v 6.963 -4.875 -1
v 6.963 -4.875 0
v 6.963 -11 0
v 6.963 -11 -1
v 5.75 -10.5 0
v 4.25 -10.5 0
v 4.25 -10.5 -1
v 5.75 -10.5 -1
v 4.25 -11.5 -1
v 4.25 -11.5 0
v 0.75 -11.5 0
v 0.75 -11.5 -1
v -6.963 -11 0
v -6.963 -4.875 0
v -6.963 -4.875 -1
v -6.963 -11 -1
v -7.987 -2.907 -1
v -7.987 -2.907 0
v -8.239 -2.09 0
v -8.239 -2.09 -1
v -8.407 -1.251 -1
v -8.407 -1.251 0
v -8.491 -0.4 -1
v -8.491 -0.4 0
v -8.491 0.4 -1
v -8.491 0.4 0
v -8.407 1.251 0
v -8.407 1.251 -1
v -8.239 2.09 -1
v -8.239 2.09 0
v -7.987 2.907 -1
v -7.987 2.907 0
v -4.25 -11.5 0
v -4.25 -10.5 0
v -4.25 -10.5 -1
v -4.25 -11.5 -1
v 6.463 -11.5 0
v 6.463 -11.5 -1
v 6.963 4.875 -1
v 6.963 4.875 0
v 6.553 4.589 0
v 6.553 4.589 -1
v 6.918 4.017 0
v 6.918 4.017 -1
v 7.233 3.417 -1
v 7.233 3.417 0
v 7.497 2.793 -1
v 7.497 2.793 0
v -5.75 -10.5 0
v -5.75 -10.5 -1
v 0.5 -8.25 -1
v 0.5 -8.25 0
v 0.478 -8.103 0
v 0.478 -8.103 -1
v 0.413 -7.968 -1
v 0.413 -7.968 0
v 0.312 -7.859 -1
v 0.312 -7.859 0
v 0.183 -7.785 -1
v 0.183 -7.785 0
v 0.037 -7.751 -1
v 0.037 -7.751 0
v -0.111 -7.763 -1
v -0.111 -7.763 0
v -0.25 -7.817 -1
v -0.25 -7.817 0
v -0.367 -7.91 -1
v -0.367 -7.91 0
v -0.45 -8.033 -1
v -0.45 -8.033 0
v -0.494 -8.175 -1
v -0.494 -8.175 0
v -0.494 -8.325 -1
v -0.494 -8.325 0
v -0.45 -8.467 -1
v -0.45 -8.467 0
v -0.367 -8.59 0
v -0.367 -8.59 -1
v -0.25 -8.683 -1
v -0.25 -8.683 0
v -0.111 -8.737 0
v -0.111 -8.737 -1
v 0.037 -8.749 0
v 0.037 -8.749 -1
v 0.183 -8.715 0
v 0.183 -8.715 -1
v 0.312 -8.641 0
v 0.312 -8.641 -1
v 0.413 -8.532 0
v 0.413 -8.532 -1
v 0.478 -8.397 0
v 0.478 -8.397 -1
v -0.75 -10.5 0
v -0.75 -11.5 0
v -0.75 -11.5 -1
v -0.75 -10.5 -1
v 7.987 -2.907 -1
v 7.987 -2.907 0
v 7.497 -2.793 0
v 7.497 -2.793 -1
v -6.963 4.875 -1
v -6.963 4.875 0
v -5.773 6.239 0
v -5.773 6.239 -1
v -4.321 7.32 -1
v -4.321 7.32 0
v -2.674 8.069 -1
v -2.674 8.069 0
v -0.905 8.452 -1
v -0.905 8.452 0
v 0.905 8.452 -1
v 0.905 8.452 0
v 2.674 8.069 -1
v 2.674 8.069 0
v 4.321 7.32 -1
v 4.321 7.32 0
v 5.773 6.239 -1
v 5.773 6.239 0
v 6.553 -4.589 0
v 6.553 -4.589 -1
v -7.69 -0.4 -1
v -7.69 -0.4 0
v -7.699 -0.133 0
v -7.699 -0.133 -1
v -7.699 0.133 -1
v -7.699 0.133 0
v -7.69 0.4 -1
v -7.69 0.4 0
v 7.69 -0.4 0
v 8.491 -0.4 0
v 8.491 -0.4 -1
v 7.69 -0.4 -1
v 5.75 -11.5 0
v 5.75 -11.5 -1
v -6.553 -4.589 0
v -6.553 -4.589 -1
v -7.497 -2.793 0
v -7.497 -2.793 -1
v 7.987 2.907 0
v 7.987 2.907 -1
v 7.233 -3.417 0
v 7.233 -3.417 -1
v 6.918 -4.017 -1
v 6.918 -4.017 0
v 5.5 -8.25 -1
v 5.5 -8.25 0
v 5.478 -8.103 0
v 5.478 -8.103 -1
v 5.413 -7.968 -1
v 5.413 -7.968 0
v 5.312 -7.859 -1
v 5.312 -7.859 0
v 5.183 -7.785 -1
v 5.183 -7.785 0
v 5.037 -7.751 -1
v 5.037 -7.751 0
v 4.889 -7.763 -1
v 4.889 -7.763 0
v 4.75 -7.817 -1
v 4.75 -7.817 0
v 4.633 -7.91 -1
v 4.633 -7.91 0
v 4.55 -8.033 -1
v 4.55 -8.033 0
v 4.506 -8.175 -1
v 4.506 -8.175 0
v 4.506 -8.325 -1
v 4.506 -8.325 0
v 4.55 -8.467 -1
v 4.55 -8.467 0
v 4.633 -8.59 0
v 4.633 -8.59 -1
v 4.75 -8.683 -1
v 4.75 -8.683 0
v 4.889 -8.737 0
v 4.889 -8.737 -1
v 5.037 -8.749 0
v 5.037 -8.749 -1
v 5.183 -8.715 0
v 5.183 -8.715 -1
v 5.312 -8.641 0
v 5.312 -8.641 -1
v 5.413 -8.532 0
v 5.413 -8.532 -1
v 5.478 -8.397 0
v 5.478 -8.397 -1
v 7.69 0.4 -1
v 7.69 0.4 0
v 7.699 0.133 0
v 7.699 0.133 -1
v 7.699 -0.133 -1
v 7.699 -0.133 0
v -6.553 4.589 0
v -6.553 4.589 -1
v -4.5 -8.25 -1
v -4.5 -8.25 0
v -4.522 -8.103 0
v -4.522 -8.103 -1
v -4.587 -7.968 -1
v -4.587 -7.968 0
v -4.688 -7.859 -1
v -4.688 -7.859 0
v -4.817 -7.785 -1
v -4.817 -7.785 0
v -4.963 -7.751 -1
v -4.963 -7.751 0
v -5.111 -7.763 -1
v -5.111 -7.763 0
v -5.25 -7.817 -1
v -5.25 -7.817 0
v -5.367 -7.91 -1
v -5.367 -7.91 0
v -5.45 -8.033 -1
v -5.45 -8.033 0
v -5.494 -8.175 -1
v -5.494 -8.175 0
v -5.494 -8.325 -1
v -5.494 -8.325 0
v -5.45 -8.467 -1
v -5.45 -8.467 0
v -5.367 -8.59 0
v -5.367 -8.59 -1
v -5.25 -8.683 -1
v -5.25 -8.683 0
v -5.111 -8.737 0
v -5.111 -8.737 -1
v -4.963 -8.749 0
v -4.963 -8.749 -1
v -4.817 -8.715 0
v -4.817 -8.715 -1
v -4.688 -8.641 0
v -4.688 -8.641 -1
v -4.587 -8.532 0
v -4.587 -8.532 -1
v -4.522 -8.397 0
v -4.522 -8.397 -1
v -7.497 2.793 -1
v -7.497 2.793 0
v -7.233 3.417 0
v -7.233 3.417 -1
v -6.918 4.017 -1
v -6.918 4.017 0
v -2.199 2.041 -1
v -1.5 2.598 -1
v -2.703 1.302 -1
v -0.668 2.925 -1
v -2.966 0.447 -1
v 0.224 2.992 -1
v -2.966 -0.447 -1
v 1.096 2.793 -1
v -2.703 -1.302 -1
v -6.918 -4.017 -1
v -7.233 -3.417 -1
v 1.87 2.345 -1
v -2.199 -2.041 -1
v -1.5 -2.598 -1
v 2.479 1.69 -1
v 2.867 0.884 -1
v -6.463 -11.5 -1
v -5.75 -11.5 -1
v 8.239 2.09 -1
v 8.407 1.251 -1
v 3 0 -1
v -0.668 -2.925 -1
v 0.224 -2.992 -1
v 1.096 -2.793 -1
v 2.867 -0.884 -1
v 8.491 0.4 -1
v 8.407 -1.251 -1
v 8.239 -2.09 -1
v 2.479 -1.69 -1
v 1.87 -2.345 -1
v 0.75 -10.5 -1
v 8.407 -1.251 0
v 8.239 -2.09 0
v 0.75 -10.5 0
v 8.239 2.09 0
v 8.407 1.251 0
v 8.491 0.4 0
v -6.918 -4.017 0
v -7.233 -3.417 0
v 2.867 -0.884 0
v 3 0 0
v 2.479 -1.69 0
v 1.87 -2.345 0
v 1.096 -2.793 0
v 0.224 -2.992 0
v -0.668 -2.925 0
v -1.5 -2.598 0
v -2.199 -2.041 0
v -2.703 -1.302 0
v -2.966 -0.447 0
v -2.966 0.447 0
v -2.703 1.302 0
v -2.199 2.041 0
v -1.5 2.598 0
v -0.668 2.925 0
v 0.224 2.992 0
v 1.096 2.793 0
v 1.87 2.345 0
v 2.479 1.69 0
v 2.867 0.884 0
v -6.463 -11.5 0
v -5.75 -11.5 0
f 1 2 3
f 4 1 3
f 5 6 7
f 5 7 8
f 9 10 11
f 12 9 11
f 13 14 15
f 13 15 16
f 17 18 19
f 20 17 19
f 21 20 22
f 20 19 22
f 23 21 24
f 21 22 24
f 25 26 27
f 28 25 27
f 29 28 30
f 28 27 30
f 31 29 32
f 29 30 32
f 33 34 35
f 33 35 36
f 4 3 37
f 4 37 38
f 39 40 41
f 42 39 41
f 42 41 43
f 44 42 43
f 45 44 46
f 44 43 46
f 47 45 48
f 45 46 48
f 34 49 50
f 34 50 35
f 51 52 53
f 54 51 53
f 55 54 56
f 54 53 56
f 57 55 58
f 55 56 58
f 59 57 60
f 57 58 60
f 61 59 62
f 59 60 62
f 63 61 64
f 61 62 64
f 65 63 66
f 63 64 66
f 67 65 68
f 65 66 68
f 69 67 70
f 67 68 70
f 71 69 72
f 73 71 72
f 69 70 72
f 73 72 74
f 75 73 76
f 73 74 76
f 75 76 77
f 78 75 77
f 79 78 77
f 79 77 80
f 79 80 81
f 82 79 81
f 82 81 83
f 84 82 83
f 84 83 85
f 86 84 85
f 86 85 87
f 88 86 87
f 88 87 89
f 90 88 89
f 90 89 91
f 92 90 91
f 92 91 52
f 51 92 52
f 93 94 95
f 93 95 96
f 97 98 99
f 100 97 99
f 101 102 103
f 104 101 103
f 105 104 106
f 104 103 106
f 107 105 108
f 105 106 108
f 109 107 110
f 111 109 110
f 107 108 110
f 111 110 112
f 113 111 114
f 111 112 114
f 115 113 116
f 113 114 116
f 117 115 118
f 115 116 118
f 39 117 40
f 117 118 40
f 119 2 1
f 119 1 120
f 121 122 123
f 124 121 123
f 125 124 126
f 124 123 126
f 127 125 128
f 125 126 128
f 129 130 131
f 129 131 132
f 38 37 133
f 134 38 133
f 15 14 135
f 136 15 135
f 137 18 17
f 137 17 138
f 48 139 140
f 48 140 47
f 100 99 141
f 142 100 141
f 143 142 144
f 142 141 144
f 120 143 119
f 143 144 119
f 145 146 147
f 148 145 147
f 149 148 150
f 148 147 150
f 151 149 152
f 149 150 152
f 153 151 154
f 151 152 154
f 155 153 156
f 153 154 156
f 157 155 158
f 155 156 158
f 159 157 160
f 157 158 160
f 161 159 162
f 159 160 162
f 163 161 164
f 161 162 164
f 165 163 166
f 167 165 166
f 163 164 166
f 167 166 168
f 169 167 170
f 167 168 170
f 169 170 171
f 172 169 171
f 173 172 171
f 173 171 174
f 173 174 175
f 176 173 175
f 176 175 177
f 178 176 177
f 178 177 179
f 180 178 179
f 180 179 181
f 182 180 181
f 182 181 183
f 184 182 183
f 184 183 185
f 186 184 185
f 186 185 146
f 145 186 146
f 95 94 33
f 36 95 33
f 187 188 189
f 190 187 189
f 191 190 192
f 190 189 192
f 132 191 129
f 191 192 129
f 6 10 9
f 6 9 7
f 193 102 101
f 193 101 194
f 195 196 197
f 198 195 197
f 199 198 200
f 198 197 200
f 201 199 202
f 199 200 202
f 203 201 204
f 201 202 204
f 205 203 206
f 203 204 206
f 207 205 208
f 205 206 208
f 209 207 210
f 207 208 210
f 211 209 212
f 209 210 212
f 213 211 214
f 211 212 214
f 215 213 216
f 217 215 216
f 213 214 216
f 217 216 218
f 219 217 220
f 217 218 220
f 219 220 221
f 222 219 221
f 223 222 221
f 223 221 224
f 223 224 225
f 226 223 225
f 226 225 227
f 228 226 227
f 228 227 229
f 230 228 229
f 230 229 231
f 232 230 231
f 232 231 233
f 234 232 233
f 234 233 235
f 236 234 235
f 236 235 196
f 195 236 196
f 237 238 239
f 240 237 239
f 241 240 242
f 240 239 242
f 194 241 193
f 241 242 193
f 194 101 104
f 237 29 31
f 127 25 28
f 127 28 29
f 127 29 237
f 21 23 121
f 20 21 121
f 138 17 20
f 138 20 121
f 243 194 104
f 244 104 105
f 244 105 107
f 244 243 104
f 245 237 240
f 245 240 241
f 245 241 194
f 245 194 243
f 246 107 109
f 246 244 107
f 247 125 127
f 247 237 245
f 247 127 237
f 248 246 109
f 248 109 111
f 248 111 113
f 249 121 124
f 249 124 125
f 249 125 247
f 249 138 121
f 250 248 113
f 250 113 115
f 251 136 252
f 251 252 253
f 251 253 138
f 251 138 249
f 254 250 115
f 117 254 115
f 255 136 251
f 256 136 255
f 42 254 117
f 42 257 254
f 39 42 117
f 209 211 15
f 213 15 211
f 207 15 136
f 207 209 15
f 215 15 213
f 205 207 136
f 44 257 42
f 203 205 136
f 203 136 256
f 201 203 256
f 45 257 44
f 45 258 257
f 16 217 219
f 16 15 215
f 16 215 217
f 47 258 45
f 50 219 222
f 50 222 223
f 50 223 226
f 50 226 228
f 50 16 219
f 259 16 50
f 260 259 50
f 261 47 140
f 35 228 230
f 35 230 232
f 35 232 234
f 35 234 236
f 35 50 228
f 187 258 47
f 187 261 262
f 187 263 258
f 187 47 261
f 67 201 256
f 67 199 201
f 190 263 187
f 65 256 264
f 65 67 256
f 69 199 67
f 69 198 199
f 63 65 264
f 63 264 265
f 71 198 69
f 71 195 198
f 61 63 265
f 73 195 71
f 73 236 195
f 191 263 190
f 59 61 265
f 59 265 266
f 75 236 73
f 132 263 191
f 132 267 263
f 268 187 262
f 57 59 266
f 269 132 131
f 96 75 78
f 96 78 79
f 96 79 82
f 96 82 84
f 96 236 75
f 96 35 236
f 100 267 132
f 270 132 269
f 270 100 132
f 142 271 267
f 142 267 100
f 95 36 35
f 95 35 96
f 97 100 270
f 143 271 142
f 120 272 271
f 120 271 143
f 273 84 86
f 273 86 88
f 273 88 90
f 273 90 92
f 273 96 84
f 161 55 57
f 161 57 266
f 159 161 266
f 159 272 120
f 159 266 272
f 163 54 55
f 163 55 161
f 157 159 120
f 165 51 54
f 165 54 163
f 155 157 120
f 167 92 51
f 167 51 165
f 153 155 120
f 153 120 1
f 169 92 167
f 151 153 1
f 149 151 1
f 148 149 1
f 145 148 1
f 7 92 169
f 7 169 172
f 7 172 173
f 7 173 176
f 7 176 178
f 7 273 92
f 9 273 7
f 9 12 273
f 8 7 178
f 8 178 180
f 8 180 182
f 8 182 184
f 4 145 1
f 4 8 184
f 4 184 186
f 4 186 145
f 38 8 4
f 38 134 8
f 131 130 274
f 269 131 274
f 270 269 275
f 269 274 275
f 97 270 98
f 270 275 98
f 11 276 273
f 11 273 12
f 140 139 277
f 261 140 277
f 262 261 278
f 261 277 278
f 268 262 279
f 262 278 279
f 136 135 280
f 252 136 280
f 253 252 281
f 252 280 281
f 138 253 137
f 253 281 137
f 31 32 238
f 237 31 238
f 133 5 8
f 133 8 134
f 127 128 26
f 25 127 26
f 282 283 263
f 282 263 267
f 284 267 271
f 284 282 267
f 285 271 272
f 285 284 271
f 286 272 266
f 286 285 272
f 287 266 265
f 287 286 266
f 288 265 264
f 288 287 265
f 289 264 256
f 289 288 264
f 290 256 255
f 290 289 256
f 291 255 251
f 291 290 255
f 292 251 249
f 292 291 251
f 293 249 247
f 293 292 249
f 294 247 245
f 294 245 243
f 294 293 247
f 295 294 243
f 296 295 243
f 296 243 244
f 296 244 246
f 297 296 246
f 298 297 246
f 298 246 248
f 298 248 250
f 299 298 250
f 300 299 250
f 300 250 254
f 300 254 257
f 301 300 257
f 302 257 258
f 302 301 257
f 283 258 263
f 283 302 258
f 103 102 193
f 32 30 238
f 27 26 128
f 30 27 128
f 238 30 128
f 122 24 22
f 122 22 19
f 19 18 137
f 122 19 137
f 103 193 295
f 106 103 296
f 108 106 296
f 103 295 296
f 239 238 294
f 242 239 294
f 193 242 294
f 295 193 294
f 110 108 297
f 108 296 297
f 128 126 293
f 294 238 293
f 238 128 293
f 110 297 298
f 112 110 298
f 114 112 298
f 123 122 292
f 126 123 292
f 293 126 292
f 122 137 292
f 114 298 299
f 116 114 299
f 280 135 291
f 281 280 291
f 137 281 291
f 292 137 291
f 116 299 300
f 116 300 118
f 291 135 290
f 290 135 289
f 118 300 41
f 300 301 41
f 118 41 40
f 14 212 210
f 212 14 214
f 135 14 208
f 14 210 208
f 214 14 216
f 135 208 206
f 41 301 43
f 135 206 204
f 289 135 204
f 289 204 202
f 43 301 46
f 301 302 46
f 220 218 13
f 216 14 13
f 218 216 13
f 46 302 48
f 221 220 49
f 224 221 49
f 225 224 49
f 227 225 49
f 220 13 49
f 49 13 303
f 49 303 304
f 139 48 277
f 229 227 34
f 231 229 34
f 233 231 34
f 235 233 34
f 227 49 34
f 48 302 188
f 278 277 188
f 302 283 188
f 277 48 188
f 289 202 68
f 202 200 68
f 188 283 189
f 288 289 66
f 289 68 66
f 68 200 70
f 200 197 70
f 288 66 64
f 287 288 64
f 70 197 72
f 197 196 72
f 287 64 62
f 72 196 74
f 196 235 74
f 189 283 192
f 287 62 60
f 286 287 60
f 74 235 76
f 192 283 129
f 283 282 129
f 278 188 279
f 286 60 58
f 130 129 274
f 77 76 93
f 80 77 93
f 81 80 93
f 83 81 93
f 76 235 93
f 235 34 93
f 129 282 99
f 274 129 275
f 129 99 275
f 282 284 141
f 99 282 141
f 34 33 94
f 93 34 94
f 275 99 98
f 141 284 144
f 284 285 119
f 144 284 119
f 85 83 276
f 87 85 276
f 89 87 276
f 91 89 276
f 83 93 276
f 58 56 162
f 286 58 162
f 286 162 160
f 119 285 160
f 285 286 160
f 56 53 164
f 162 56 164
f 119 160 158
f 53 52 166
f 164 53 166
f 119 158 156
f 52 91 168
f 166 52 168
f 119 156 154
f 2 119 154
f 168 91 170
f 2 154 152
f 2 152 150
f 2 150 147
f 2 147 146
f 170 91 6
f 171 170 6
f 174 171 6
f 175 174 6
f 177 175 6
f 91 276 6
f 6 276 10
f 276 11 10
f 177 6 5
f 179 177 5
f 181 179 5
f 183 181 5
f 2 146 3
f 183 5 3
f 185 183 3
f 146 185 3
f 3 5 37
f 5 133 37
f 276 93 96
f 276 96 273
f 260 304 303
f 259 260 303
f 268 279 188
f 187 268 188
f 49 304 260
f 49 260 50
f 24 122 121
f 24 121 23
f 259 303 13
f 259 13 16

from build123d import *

# Parameters (mm, degrees)
SKETCH006_R     = 3
PAD005_DEPTH    = 1
SKETCH012_R     = 0.5
POCKET002_DEPTH = 2
POCKET003_DEPTH = 5
CHAMFER_SIZE    = 0.5


with BuildPart() as part:
    # Sketch006 (on ShapeBinder) → Pad005 (new body)
    with BuildSketch(Plane(origin=(0, 0, 0), x_dir=(1, 0, 0), z_dir=(0, 0, -1))):
        with BuildLine():
            ThreePointArc((-7.987387, 2.907171), (-8.333808, 1.672617), (-8.490583, 0.4))
            Line((-7.689603, 0.4), (-8.490583, 0.4))
            ThreePointArc((-7.689603, 0.4), (-7.7, 0), (-7.689603, -0.4))
            Line((-7.689603, -0.4), (-8.490583, -0.4))
            ThreePointArc((-8.490583, -0.4), (-8.333808, -1.672617), (-7.987387, -2.907171))
            Line((-7.987387, -2.907171), (-7.496671, -2.792834))
            ThreePointArc((-7.496671, -2.792834), (-7.082093, -3.720747), (-6.553216, -4.588611))
            Line((-6.962792, -4.8754), (-6.553216, -4.588611))
            ThreePointArc((-6.962792, -4.8754), (0, -8.5), (6.962792, -4.8754))
            Line((6.962792, -4.8754), (6.553216, -4.588611))
            ThreePointArc((6.553216, -4.588611), (7.082093, -3.720747), (7.496671, -2.792834))
            Line((7.987387, -2.907171), (7.496671, -2.792834))
            ThreePointArc((7.987387, -2.907171), (8.333808, -1.672617), (8.490583, -0.4))
            Line((8.490583, -0.4), (7.689603, -0.4))
            ThreePointArc((7.689603, -0.4), (7.7, 0), (7.689603, 0.4))
            Line((8.490583, 0.4), (7.689603, 0.4))
            ThreePointArc((8.490583, 0.4), (8.333808, 1.672617), (7.987387, 2.907171))
            Line((7.987387, 2.907171), (7.496671, 2.792834))
            ThreePointArc((7.496671, 2.792834), (7.082093, 3.720747), (6.553216, 4.588611))
            Line((6.962792, 4.8754), (6.553216, 4.588611))
            Line((6.962792, 4.8754), (6.962792, 11.5))
            Line((6.962792, 11.5), (-6.962792, 11.5))
            Line((-6.962792, 4.8754), (-6.962792, 11.5))
            Line((-6.962792, 4.8754), (-6.553216, 4.588611))
            ThreePointArc((-6.553216, 4.588611), (-7.082093, 3.720747), (-7.496671, 2.792834))
            Line((-7.987387, 2.907171), (-7.496671, 2.792834))
        make_face()
        Circle(SKETCH006_R, mode=Mode.SUBTRACT)
    extrude(amount=PAD005_DEPTH)

    # Sketch012 (on Face28 of Pad005) → Pocket002 (cut)
    with BuildSketch(Plane.XY):
        with Locations((0, -8.25)):
            Circle(SKETCH012_R)
        with Locations((-5, -8.25)):
            Circle(SKETCH012_R)
        with Locations((5, -8.25)):
            Circle(SKETCH012_R)
    extrude(amount=-POCKET002_DEPTH, mode=Mode.SUBTRACT)

    # Sketch013 (on Face4 of Pocket002) → Pocket003 (cut)
    with BuildSketch(Plane.XY):
        Polygon((-6.962792, -11.5), (-5.75, -11.5), (-5.75, -10.5), (-4.25, -10.5), (-4.25, -11.5), (-0.75, -11.5), (-0.75, -10.5), (0.75, -10.5), (0.75, -11.5), (4.25, -11.5), (4.25, -10.5), (5.75, -10.5), (5.75, -11.5), (6.962792, -11.5), (6.962792, -12.871278), (-6.962792, -12.871278), align=None)
    extrude(amount=-POCKET003_DEPTH, mode=Mode.SUBTRACT)

    # Chamfer
    chamfer_edges = [part.edges().sort_by_distance(p)[0] for p in [
        (-6.962792, -11.5, -0.5),
        (6.962792, -11.5, -0.5),
    ]]
    chamfer(chamfer_edges, length=CHAMFER_SIZE)


solid = part.part
